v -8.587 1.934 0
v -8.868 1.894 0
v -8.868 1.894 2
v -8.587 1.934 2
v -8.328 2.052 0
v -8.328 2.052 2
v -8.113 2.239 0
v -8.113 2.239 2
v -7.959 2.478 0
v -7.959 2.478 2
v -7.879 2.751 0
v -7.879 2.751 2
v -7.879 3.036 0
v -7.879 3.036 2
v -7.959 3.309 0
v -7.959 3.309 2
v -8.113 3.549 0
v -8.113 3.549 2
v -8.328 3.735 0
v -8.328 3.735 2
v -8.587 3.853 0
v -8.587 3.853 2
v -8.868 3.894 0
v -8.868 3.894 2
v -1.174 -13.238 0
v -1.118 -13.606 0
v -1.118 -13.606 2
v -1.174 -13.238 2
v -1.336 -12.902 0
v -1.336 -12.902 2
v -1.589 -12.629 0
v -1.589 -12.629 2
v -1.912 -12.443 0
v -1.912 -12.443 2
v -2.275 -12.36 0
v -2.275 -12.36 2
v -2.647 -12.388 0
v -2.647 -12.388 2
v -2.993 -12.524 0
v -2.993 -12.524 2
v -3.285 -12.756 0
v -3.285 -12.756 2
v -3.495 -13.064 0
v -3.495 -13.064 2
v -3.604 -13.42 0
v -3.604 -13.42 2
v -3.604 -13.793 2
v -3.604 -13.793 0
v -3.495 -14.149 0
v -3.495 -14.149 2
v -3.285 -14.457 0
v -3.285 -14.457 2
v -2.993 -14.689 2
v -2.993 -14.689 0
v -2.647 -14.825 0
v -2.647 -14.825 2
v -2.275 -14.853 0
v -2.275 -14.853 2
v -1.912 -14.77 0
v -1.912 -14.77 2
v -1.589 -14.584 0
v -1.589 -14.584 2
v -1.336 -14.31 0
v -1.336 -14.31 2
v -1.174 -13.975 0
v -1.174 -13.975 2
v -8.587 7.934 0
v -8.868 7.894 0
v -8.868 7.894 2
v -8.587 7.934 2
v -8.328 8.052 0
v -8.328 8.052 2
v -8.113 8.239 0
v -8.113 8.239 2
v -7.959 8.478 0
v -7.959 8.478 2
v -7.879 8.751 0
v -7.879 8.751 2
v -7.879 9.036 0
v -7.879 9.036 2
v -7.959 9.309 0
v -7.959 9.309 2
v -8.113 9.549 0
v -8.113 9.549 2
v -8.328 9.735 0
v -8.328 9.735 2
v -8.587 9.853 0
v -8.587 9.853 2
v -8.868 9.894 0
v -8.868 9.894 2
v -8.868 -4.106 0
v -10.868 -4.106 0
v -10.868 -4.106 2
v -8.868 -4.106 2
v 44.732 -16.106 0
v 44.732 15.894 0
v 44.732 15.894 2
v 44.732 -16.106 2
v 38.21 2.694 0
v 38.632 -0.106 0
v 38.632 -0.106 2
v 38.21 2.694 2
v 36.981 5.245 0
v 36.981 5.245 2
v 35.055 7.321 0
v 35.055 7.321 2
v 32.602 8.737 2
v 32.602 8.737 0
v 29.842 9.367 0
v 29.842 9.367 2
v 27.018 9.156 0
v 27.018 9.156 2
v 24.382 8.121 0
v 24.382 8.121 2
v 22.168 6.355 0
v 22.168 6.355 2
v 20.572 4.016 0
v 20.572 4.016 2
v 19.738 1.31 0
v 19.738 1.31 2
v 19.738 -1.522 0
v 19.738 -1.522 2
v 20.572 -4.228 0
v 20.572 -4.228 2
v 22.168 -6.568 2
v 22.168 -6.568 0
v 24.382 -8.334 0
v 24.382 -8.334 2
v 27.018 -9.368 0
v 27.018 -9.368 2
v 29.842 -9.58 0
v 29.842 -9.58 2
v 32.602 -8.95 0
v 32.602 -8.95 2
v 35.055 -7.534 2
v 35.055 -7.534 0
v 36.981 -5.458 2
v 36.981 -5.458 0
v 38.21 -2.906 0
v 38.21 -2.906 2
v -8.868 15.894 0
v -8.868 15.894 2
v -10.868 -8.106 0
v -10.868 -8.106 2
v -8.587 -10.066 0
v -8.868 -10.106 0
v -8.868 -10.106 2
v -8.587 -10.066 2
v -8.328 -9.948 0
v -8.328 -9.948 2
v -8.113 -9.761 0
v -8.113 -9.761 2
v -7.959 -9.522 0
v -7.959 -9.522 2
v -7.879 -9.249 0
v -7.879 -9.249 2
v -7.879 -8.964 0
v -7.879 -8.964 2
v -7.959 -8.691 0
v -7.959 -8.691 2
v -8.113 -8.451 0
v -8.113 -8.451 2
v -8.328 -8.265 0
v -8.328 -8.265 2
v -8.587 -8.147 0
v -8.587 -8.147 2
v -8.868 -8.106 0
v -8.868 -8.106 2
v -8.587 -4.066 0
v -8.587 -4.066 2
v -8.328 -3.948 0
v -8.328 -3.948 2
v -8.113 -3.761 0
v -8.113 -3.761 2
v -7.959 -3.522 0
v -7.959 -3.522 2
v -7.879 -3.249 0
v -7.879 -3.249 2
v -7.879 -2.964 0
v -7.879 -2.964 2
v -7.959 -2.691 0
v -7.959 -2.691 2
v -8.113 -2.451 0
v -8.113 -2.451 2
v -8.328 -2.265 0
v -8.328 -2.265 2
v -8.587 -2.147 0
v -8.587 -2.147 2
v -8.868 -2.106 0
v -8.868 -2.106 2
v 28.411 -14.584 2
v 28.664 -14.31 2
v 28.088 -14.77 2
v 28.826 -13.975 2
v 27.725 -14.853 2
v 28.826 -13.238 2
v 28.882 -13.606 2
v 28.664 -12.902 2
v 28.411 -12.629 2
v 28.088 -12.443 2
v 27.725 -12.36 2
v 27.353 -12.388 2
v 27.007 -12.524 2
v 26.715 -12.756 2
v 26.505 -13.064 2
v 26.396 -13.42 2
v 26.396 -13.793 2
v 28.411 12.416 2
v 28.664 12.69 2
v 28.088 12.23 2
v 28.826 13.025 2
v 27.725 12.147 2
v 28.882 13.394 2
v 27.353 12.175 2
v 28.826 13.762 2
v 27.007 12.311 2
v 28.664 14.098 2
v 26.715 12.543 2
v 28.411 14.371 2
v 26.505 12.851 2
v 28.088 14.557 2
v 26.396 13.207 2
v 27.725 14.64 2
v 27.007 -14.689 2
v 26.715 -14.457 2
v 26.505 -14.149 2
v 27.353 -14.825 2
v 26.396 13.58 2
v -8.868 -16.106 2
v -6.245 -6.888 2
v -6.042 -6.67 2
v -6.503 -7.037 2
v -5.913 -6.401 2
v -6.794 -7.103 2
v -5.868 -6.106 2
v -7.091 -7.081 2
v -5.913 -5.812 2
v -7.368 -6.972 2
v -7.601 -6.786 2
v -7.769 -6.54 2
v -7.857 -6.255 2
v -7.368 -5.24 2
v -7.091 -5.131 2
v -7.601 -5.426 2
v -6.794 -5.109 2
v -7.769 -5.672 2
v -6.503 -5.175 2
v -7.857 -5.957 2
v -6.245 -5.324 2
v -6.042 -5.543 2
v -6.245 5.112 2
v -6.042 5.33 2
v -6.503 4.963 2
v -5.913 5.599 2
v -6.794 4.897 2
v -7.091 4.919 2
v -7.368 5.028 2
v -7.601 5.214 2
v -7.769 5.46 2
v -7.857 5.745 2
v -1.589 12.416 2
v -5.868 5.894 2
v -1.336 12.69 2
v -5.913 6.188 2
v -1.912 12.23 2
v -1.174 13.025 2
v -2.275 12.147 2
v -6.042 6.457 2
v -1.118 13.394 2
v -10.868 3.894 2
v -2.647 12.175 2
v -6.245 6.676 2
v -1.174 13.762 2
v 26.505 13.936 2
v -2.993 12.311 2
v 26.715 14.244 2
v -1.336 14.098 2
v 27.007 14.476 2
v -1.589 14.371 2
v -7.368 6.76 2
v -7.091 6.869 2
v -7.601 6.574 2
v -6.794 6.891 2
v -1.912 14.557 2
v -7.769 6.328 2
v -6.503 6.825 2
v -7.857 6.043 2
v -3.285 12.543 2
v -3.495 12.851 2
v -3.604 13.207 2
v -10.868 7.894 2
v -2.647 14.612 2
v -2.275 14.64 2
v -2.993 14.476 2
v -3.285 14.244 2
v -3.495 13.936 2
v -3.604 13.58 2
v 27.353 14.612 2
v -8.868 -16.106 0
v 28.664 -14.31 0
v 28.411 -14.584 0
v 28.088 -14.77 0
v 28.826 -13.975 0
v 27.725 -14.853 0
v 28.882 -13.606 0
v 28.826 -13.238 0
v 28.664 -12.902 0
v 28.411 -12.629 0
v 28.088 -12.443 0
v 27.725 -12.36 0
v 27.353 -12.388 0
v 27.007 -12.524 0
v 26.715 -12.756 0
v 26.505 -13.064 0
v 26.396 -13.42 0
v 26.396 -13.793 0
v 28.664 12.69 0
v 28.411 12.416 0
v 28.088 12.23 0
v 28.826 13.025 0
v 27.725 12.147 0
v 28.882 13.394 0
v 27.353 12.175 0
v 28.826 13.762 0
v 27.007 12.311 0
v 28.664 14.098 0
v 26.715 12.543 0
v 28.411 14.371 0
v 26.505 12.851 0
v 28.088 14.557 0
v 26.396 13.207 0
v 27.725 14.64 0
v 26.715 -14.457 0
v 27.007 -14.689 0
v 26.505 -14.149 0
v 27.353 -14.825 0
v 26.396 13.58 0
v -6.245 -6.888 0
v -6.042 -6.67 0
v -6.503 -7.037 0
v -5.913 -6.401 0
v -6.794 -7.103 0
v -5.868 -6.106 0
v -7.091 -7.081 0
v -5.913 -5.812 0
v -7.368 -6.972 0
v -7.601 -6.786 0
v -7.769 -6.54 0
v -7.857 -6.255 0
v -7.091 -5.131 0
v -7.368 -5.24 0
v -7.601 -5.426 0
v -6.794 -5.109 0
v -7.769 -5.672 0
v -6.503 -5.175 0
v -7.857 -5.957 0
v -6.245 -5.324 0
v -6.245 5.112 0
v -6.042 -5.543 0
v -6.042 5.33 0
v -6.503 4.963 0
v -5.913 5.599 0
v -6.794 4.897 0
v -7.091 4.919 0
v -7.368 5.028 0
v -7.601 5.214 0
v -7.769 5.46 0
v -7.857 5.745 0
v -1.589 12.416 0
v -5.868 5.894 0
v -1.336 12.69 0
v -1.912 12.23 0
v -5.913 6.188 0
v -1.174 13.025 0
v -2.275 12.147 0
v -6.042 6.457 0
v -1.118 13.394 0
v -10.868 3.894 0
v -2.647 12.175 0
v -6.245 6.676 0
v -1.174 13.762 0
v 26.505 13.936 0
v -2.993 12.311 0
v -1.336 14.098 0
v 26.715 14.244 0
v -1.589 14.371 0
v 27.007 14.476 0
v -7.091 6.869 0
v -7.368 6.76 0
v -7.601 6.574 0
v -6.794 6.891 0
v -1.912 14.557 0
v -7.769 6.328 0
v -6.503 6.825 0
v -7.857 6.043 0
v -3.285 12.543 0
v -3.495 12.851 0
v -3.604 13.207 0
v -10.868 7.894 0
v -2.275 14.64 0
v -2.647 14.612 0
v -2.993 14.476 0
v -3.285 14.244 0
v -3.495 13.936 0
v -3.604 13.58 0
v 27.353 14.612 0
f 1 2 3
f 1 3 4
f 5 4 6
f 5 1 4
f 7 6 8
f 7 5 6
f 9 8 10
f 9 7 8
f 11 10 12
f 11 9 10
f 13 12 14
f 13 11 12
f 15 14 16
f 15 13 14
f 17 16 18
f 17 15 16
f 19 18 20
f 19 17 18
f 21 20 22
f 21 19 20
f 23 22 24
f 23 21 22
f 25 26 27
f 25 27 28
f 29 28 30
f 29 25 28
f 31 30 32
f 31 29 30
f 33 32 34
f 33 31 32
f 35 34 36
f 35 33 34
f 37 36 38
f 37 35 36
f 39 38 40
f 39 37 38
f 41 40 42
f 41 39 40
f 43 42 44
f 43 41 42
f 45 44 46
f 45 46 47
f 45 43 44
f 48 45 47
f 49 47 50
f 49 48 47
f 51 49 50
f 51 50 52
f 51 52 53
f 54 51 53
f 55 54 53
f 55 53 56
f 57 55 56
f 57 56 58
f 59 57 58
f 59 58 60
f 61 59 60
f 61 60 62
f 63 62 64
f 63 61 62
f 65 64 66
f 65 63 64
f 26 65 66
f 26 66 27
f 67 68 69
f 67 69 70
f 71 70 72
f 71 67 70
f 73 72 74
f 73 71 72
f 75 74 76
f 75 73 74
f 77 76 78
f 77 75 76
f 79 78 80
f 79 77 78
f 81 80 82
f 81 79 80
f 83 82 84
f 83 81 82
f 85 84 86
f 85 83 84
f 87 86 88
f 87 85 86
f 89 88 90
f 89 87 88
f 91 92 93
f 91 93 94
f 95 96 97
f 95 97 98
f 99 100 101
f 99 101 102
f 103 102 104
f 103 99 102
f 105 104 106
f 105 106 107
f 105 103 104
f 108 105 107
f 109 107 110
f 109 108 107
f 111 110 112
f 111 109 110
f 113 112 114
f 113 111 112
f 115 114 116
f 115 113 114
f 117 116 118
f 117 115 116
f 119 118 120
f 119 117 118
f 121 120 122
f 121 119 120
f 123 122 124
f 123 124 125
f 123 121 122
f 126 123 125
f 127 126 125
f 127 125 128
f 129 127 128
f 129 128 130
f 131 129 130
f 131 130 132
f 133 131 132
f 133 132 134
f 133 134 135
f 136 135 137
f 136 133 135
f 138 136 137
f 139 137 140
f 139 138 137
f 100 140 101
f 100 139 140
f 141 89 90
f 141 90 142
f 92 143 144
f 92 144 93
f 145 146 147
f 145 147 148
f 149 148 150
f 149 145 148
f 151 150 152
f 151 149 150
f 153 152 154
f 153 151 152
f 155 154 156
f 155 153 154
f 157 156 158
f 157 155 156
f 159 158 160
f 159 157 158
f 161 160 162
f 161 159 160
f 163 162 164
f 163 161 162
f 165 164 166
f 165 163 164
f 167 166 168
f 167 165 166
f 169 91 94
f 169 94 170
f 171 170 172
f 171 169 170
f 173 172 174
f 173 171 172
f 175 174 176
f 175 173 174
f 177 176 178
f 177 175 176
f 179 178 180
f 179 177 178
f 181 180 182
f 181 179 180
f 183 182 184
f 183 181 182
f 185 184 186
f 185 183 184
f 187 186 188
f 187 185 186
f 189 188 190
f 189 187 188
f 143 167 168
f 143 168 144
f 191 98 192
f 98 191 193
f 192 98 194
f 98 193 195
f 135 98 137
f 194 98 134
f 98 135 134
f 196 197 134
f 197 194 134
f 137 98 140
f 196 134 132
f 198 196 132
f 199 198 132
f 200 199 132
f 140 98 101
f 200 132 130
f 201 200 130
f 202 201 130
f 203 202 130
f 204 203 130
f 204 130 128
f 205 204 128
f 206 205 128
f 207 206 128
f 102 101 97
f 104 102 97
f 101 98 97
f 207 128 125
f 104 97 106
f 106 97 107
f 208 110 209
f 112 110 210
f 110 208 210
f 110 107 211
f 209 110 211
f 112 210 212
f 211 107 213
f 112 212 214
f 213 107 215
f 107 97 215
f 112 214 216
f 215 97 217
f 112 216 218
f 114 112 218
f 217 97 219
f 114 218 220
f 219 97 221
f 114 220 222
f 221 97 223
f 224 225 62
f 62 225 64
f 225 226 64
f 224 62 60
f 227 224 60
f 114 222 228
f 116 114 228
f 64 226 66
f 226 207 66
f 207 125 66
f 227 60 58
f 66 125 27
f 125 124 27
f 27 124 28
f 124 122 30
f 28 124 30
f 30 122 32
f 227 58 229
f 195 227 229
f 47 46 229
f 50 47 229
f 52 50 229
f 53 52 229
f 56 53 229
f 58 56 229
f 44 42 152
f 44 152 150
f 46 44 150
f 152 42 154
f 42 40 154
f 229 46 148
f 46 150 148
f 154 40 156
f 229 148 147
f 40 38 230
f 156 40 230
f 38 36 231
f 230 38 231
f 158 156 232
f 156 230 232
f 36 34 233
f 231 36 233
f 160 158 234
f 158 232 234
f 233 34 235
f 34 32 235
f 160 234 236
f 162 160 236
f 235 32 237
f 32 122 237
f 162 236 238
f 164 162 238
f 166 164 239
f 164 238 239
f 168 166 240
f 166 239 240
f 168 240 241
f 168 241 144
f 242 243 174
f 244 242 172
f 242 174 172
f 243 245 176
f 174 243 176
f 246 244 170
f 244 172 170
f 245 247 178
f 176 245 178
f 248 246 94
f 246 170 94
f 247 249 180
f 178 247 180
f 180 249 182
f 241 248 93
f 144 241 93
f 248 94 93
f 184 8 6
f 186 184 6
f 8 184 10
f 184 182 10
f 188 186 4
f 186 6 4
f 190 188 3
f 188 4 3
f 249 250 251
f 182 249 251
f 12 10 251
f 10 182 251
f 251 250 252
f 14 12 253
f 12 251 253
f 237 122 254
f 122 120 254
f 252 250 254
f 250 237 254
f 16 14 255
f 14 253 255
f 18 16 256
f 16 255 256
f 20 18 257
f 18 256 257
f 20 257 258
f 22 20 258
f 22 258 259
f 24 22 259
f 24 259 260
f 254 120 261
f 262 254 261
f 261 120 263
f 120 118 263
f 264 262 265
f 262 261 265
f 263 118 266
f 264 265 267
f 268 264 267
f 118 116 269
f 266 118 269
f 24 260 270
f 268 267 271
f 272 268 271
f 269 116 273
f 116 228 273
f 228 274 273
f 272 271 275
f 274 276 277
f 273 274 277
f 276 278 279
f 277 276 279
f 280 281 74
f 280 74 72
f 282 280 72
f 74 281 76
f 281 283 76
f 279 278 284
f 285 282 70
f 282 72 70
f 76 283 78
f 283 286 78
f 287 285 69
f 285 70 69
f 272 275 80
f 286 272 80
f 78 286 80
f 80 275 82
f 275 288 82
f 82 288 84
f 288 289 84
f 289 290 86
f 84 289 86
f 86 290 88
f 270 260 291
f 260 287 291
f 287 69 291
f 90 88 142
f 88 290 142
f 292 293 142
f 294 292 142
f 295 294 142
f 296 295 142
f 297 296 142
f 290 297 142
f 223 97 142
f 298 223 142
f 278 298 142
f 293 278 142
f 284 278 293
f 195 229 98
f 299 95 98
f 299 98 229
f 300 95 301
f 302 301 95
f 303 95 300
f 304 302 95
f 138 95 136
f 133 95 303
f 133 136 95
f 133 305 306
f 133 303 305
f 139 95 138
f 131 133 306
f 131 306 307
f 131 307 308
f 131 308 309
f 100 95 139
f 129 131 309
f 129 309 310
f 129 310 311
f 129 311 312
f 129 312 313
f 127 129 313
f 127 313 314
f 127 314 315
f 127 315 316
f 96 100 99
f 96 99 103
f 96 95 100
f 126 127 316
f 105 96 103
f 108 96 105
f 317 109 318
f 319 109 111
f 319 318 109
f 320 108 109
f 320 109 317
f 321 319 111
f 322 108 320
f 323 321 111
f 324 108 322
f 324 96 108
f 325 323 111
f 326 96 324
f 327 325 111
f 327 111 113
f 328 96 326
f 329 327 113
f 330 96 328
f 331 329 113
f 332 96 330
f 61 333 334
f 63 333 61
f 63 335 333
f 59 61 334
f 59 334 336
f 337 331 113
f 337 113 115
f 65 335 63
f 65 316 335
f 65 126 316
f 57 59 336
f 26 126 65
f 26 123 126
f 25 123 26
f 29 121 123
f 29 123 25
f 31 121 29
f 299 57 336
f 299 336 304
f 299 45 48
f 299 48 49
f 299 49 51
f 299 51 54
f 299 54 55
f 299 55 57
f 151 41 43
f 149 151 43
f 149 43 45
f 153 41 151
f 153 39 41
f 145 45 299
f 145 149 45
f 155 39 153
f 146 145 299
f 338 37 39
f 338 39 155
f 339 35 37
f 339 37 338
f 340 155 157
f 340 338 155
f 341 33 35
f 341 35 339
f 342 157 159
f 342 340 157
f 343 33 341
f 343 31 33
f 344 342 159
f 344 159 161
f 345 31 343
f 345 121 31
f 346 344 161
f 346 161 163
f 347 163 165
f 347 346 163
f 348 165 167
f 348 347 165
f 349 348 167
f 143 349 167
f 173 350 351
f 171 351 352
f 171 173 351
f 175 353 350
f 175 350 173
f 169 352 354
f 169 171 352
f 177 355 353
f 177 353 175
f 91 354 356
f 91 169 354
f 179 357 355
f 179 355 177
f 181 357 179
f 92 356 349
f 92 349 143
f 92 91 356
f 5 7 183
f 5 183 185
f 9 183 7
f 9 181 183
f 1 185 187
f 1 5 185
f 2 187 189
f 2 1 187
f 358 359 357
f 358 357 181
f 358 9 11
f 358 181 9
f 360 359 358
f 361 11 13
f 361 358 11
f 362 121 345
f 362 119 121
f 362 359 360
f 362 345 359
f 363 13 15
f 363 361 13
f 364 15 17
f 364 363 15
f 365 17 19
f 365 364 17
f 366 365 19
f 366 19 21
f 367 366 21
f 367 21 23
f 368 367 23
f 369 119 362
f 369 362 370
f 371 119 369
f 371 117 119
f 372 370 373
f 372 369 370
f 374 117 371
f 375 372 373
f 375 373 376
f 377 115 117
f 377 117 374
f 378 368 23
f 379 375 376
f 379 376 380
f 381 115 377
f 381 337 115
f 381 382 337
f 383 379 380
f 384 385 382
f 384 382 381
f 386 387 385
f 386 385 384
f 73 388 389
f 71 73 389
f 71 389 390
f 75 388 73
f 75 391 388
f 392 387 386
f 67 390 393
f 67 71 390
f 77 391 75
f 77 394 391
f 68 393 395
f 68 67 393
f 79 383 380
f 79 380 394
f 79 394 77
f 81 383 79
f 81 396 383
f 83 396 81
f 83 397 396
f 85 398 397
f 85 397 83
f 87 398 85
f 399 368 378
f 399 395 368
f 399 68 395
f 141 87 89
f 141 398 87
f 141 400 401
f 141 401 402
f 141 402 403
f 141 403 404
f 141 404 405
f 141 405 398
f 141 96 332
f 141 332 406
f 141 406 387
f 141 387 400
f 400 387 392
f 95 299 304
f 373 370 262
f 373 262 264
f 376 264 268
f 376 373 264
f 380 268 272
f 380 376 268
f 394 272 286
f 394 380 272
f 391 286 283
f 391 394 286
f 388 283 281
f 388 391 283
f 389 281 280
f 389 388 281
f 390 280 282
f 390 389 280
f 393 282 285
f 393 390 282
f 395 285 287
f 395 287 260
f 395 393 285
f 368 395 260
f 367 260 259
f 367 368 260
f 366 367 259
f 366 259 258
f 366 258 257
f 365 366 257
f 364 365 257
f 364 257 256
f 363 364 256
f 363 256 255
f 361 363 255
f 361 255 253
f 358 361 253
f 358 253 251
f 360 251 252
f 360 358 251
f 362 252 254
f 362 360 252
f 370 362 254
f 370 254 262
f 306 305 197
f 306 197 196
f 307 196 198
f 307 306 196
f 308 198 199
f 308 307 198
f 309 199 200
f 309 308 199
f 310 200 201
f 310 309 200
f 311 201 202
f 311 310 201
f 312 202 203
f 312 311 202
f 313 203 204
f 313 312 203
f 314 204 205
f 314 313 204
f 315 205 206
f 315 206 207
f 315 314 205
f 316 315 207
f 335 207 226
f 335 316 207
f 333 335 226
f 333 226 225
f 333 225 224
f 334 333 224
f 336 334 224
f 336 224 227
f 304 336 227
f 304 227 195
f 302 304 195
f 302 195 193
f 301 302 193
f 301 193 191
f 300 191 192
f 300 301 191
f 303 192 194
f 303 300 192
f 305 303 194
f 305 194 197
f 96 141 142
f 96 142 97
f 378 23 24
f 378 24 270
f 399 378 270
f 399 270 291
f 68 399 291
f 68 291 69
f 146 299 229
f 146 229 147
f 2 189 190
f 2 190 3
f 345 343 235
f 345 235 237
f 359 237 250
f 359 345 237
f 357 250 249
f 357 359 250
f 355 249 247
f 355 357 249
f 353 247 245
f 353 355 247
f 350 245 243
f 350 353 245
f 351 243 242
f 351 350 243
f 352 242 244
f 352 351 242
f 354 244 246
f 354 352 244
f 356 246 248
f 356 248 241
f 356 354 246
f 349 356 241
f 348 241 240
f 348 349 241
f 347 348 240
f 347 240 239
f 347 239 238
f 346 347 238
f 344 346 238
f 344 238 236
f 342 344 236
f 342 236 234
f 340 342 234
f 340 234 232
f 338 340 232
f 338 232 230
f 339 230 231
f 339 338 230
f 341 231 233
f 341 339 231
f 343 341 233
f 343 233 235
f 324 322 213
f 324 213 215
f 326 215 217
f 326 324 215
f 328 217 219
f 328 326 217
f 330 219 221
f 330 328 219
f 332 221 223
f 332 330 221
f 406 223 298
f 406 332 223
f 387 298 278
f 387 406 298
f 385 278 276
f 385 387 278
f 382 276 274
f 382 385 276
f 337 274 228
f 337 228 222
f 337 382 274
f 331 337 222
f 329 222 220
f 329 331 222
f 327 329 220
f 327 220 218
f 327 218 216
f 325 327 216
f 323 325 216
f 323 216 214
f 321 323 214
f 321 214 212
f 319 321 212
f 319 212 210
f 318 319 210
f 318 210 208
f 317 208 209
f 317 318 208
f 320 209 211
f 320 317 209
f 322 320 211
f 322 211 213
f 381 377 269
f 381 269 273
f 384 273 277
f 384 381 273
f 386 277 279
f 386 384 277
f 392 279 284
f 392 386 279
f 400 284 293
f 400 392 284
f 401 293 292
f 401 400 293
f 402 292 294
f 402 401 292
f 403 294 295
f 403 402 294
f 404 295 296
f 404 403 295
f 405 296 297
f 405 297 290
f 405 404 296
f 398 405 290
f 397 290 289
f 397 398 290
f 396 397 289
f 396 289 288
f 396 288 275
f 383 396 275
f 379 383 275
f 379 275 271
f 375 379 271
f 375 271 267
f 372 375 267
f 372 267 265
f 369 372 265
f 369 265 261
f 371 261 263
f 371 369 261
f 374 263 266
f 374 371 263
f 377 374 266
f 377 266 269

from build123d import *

# Parameters (mm, degrees)
SKETCH_1_R      = 1
SKETCH_1_R_2    = 1.25
SKETCH_1_R_3    = 9.5
EXTRUDE_1_DEPTH = 2


with BuildPart() as part:
    # 草圖1 → 填料-伸長1 (new body)
    with BuildSketch(Plane.XY):
        with BuildLine():
            Line((-8.868434636, 14.893709246), (-8.868434636, 15.893709246))
            Line((-8.868434636, 15.893709246), (-7.868434636, 15.893709246))
            Line((-7.868434636, 15.893709246), (43.781565364, 15.893709246))
            Line((43.781565364, 15.893709246), (44.731565364, 15.893709246))
            Line((44.731565364, 15.893709246), (44.731565364, 14.893709246))
            Line((44.731565364, 14.893709246), (44.731565364, -15.106290754))
            Line((44.731565364, -15.106290754), (44.731565364, -16.106290754))
            Line((44.731565364, -16.106290754), (43.781565364, -16.106290754))
            Line((43.781565364, -16.106290754), (-7.868434636, -16.106290754))
            Line((-7.868434636, -16.106290754), (-8.868434636, -16.106290754))
            Line((-8.868434636, -16.106290754), (-8.868434636, -15.106290754))
            Line((-8.868434636, -15.106290754), (-8.868434636, -10.106290754))
            ThreePointArc((-8.868434636, -10.106290754), (-7.868434636, -9.106290754), (-8.868434636, -8.106290754))
            Line((-8.868434636, -8.106290754), (-10.868434636, -8.106290754))
            Line((-10.868434636, -8.106290754), (-10.868434636, -4.106290754))
            Line((-10.868434636, -4.106290754), (-8.868434636, -4.106290754))
            ThreePointArc((-8.868434636, -4.106290754), (-7.868434636, -3.106290754), (-8.868434636, -2.106290754))
            Line((-8.868434636, -2.106290754), (-8.868434636, 1.893709246))
            ThreePointArc((-8.868434636, 1.893709246), (-7.868434636, 2.893709246), (-8.868434636, 3.893709246))
            Line((-8.868434636, 3.893709246), (-10.868434636, 3.893709246))
            Line((-10.868434636, 3.893709246), (-10.868434636, 7.893709246))
            Line((-10.868434636, 7.893709246), (-8.868434636, 7.893709246))
            ThreePointArc((-8.868434636, 7.893709246), (-7.868434636, 8.893709246), (-8.868434636, 9.893709246))
            Line((-8.868434636, 9.893709246), (-8.868434636, 14.893709246))
        make_face()
        with Locations((-6.868434636, 5.893709246)):
            Circle(SKETCH_1_R, mode=Mode.SUBTRACT)
        with Locations((-6.868434636, -6.106290754)):
            Circle(SKETCH_1_R, mode=Mode.SUBTRACT)
        with Locations((-2.368434636, 13.393709246)):
            Circle(SKETCH_1_R_2, mode=Mode.SUBTRACT)
        with Locations((-2.368434636, -13.606290754)):
            Circle(SKETCH_1_R_2, mode=Mode.SUBTRACT)
        with Locations((27.631565364, 13.393709246)):
            Circle(SKETCH_1_R_2, mode=Mode.SUBTRACT)
        with Locations((27.631565364, -13.606290754)):
            Circle(SKETCH_1_R_2, mode=Mode.SUBTRACT)
        with Locations((29.131565364, -0.106290754)):
            Circle(SKETCH_1_R_3, mode=Mode.SUBTRACT)
    extrude(amount=EXTRUDE_1_DEPTH)


solid = part.part
